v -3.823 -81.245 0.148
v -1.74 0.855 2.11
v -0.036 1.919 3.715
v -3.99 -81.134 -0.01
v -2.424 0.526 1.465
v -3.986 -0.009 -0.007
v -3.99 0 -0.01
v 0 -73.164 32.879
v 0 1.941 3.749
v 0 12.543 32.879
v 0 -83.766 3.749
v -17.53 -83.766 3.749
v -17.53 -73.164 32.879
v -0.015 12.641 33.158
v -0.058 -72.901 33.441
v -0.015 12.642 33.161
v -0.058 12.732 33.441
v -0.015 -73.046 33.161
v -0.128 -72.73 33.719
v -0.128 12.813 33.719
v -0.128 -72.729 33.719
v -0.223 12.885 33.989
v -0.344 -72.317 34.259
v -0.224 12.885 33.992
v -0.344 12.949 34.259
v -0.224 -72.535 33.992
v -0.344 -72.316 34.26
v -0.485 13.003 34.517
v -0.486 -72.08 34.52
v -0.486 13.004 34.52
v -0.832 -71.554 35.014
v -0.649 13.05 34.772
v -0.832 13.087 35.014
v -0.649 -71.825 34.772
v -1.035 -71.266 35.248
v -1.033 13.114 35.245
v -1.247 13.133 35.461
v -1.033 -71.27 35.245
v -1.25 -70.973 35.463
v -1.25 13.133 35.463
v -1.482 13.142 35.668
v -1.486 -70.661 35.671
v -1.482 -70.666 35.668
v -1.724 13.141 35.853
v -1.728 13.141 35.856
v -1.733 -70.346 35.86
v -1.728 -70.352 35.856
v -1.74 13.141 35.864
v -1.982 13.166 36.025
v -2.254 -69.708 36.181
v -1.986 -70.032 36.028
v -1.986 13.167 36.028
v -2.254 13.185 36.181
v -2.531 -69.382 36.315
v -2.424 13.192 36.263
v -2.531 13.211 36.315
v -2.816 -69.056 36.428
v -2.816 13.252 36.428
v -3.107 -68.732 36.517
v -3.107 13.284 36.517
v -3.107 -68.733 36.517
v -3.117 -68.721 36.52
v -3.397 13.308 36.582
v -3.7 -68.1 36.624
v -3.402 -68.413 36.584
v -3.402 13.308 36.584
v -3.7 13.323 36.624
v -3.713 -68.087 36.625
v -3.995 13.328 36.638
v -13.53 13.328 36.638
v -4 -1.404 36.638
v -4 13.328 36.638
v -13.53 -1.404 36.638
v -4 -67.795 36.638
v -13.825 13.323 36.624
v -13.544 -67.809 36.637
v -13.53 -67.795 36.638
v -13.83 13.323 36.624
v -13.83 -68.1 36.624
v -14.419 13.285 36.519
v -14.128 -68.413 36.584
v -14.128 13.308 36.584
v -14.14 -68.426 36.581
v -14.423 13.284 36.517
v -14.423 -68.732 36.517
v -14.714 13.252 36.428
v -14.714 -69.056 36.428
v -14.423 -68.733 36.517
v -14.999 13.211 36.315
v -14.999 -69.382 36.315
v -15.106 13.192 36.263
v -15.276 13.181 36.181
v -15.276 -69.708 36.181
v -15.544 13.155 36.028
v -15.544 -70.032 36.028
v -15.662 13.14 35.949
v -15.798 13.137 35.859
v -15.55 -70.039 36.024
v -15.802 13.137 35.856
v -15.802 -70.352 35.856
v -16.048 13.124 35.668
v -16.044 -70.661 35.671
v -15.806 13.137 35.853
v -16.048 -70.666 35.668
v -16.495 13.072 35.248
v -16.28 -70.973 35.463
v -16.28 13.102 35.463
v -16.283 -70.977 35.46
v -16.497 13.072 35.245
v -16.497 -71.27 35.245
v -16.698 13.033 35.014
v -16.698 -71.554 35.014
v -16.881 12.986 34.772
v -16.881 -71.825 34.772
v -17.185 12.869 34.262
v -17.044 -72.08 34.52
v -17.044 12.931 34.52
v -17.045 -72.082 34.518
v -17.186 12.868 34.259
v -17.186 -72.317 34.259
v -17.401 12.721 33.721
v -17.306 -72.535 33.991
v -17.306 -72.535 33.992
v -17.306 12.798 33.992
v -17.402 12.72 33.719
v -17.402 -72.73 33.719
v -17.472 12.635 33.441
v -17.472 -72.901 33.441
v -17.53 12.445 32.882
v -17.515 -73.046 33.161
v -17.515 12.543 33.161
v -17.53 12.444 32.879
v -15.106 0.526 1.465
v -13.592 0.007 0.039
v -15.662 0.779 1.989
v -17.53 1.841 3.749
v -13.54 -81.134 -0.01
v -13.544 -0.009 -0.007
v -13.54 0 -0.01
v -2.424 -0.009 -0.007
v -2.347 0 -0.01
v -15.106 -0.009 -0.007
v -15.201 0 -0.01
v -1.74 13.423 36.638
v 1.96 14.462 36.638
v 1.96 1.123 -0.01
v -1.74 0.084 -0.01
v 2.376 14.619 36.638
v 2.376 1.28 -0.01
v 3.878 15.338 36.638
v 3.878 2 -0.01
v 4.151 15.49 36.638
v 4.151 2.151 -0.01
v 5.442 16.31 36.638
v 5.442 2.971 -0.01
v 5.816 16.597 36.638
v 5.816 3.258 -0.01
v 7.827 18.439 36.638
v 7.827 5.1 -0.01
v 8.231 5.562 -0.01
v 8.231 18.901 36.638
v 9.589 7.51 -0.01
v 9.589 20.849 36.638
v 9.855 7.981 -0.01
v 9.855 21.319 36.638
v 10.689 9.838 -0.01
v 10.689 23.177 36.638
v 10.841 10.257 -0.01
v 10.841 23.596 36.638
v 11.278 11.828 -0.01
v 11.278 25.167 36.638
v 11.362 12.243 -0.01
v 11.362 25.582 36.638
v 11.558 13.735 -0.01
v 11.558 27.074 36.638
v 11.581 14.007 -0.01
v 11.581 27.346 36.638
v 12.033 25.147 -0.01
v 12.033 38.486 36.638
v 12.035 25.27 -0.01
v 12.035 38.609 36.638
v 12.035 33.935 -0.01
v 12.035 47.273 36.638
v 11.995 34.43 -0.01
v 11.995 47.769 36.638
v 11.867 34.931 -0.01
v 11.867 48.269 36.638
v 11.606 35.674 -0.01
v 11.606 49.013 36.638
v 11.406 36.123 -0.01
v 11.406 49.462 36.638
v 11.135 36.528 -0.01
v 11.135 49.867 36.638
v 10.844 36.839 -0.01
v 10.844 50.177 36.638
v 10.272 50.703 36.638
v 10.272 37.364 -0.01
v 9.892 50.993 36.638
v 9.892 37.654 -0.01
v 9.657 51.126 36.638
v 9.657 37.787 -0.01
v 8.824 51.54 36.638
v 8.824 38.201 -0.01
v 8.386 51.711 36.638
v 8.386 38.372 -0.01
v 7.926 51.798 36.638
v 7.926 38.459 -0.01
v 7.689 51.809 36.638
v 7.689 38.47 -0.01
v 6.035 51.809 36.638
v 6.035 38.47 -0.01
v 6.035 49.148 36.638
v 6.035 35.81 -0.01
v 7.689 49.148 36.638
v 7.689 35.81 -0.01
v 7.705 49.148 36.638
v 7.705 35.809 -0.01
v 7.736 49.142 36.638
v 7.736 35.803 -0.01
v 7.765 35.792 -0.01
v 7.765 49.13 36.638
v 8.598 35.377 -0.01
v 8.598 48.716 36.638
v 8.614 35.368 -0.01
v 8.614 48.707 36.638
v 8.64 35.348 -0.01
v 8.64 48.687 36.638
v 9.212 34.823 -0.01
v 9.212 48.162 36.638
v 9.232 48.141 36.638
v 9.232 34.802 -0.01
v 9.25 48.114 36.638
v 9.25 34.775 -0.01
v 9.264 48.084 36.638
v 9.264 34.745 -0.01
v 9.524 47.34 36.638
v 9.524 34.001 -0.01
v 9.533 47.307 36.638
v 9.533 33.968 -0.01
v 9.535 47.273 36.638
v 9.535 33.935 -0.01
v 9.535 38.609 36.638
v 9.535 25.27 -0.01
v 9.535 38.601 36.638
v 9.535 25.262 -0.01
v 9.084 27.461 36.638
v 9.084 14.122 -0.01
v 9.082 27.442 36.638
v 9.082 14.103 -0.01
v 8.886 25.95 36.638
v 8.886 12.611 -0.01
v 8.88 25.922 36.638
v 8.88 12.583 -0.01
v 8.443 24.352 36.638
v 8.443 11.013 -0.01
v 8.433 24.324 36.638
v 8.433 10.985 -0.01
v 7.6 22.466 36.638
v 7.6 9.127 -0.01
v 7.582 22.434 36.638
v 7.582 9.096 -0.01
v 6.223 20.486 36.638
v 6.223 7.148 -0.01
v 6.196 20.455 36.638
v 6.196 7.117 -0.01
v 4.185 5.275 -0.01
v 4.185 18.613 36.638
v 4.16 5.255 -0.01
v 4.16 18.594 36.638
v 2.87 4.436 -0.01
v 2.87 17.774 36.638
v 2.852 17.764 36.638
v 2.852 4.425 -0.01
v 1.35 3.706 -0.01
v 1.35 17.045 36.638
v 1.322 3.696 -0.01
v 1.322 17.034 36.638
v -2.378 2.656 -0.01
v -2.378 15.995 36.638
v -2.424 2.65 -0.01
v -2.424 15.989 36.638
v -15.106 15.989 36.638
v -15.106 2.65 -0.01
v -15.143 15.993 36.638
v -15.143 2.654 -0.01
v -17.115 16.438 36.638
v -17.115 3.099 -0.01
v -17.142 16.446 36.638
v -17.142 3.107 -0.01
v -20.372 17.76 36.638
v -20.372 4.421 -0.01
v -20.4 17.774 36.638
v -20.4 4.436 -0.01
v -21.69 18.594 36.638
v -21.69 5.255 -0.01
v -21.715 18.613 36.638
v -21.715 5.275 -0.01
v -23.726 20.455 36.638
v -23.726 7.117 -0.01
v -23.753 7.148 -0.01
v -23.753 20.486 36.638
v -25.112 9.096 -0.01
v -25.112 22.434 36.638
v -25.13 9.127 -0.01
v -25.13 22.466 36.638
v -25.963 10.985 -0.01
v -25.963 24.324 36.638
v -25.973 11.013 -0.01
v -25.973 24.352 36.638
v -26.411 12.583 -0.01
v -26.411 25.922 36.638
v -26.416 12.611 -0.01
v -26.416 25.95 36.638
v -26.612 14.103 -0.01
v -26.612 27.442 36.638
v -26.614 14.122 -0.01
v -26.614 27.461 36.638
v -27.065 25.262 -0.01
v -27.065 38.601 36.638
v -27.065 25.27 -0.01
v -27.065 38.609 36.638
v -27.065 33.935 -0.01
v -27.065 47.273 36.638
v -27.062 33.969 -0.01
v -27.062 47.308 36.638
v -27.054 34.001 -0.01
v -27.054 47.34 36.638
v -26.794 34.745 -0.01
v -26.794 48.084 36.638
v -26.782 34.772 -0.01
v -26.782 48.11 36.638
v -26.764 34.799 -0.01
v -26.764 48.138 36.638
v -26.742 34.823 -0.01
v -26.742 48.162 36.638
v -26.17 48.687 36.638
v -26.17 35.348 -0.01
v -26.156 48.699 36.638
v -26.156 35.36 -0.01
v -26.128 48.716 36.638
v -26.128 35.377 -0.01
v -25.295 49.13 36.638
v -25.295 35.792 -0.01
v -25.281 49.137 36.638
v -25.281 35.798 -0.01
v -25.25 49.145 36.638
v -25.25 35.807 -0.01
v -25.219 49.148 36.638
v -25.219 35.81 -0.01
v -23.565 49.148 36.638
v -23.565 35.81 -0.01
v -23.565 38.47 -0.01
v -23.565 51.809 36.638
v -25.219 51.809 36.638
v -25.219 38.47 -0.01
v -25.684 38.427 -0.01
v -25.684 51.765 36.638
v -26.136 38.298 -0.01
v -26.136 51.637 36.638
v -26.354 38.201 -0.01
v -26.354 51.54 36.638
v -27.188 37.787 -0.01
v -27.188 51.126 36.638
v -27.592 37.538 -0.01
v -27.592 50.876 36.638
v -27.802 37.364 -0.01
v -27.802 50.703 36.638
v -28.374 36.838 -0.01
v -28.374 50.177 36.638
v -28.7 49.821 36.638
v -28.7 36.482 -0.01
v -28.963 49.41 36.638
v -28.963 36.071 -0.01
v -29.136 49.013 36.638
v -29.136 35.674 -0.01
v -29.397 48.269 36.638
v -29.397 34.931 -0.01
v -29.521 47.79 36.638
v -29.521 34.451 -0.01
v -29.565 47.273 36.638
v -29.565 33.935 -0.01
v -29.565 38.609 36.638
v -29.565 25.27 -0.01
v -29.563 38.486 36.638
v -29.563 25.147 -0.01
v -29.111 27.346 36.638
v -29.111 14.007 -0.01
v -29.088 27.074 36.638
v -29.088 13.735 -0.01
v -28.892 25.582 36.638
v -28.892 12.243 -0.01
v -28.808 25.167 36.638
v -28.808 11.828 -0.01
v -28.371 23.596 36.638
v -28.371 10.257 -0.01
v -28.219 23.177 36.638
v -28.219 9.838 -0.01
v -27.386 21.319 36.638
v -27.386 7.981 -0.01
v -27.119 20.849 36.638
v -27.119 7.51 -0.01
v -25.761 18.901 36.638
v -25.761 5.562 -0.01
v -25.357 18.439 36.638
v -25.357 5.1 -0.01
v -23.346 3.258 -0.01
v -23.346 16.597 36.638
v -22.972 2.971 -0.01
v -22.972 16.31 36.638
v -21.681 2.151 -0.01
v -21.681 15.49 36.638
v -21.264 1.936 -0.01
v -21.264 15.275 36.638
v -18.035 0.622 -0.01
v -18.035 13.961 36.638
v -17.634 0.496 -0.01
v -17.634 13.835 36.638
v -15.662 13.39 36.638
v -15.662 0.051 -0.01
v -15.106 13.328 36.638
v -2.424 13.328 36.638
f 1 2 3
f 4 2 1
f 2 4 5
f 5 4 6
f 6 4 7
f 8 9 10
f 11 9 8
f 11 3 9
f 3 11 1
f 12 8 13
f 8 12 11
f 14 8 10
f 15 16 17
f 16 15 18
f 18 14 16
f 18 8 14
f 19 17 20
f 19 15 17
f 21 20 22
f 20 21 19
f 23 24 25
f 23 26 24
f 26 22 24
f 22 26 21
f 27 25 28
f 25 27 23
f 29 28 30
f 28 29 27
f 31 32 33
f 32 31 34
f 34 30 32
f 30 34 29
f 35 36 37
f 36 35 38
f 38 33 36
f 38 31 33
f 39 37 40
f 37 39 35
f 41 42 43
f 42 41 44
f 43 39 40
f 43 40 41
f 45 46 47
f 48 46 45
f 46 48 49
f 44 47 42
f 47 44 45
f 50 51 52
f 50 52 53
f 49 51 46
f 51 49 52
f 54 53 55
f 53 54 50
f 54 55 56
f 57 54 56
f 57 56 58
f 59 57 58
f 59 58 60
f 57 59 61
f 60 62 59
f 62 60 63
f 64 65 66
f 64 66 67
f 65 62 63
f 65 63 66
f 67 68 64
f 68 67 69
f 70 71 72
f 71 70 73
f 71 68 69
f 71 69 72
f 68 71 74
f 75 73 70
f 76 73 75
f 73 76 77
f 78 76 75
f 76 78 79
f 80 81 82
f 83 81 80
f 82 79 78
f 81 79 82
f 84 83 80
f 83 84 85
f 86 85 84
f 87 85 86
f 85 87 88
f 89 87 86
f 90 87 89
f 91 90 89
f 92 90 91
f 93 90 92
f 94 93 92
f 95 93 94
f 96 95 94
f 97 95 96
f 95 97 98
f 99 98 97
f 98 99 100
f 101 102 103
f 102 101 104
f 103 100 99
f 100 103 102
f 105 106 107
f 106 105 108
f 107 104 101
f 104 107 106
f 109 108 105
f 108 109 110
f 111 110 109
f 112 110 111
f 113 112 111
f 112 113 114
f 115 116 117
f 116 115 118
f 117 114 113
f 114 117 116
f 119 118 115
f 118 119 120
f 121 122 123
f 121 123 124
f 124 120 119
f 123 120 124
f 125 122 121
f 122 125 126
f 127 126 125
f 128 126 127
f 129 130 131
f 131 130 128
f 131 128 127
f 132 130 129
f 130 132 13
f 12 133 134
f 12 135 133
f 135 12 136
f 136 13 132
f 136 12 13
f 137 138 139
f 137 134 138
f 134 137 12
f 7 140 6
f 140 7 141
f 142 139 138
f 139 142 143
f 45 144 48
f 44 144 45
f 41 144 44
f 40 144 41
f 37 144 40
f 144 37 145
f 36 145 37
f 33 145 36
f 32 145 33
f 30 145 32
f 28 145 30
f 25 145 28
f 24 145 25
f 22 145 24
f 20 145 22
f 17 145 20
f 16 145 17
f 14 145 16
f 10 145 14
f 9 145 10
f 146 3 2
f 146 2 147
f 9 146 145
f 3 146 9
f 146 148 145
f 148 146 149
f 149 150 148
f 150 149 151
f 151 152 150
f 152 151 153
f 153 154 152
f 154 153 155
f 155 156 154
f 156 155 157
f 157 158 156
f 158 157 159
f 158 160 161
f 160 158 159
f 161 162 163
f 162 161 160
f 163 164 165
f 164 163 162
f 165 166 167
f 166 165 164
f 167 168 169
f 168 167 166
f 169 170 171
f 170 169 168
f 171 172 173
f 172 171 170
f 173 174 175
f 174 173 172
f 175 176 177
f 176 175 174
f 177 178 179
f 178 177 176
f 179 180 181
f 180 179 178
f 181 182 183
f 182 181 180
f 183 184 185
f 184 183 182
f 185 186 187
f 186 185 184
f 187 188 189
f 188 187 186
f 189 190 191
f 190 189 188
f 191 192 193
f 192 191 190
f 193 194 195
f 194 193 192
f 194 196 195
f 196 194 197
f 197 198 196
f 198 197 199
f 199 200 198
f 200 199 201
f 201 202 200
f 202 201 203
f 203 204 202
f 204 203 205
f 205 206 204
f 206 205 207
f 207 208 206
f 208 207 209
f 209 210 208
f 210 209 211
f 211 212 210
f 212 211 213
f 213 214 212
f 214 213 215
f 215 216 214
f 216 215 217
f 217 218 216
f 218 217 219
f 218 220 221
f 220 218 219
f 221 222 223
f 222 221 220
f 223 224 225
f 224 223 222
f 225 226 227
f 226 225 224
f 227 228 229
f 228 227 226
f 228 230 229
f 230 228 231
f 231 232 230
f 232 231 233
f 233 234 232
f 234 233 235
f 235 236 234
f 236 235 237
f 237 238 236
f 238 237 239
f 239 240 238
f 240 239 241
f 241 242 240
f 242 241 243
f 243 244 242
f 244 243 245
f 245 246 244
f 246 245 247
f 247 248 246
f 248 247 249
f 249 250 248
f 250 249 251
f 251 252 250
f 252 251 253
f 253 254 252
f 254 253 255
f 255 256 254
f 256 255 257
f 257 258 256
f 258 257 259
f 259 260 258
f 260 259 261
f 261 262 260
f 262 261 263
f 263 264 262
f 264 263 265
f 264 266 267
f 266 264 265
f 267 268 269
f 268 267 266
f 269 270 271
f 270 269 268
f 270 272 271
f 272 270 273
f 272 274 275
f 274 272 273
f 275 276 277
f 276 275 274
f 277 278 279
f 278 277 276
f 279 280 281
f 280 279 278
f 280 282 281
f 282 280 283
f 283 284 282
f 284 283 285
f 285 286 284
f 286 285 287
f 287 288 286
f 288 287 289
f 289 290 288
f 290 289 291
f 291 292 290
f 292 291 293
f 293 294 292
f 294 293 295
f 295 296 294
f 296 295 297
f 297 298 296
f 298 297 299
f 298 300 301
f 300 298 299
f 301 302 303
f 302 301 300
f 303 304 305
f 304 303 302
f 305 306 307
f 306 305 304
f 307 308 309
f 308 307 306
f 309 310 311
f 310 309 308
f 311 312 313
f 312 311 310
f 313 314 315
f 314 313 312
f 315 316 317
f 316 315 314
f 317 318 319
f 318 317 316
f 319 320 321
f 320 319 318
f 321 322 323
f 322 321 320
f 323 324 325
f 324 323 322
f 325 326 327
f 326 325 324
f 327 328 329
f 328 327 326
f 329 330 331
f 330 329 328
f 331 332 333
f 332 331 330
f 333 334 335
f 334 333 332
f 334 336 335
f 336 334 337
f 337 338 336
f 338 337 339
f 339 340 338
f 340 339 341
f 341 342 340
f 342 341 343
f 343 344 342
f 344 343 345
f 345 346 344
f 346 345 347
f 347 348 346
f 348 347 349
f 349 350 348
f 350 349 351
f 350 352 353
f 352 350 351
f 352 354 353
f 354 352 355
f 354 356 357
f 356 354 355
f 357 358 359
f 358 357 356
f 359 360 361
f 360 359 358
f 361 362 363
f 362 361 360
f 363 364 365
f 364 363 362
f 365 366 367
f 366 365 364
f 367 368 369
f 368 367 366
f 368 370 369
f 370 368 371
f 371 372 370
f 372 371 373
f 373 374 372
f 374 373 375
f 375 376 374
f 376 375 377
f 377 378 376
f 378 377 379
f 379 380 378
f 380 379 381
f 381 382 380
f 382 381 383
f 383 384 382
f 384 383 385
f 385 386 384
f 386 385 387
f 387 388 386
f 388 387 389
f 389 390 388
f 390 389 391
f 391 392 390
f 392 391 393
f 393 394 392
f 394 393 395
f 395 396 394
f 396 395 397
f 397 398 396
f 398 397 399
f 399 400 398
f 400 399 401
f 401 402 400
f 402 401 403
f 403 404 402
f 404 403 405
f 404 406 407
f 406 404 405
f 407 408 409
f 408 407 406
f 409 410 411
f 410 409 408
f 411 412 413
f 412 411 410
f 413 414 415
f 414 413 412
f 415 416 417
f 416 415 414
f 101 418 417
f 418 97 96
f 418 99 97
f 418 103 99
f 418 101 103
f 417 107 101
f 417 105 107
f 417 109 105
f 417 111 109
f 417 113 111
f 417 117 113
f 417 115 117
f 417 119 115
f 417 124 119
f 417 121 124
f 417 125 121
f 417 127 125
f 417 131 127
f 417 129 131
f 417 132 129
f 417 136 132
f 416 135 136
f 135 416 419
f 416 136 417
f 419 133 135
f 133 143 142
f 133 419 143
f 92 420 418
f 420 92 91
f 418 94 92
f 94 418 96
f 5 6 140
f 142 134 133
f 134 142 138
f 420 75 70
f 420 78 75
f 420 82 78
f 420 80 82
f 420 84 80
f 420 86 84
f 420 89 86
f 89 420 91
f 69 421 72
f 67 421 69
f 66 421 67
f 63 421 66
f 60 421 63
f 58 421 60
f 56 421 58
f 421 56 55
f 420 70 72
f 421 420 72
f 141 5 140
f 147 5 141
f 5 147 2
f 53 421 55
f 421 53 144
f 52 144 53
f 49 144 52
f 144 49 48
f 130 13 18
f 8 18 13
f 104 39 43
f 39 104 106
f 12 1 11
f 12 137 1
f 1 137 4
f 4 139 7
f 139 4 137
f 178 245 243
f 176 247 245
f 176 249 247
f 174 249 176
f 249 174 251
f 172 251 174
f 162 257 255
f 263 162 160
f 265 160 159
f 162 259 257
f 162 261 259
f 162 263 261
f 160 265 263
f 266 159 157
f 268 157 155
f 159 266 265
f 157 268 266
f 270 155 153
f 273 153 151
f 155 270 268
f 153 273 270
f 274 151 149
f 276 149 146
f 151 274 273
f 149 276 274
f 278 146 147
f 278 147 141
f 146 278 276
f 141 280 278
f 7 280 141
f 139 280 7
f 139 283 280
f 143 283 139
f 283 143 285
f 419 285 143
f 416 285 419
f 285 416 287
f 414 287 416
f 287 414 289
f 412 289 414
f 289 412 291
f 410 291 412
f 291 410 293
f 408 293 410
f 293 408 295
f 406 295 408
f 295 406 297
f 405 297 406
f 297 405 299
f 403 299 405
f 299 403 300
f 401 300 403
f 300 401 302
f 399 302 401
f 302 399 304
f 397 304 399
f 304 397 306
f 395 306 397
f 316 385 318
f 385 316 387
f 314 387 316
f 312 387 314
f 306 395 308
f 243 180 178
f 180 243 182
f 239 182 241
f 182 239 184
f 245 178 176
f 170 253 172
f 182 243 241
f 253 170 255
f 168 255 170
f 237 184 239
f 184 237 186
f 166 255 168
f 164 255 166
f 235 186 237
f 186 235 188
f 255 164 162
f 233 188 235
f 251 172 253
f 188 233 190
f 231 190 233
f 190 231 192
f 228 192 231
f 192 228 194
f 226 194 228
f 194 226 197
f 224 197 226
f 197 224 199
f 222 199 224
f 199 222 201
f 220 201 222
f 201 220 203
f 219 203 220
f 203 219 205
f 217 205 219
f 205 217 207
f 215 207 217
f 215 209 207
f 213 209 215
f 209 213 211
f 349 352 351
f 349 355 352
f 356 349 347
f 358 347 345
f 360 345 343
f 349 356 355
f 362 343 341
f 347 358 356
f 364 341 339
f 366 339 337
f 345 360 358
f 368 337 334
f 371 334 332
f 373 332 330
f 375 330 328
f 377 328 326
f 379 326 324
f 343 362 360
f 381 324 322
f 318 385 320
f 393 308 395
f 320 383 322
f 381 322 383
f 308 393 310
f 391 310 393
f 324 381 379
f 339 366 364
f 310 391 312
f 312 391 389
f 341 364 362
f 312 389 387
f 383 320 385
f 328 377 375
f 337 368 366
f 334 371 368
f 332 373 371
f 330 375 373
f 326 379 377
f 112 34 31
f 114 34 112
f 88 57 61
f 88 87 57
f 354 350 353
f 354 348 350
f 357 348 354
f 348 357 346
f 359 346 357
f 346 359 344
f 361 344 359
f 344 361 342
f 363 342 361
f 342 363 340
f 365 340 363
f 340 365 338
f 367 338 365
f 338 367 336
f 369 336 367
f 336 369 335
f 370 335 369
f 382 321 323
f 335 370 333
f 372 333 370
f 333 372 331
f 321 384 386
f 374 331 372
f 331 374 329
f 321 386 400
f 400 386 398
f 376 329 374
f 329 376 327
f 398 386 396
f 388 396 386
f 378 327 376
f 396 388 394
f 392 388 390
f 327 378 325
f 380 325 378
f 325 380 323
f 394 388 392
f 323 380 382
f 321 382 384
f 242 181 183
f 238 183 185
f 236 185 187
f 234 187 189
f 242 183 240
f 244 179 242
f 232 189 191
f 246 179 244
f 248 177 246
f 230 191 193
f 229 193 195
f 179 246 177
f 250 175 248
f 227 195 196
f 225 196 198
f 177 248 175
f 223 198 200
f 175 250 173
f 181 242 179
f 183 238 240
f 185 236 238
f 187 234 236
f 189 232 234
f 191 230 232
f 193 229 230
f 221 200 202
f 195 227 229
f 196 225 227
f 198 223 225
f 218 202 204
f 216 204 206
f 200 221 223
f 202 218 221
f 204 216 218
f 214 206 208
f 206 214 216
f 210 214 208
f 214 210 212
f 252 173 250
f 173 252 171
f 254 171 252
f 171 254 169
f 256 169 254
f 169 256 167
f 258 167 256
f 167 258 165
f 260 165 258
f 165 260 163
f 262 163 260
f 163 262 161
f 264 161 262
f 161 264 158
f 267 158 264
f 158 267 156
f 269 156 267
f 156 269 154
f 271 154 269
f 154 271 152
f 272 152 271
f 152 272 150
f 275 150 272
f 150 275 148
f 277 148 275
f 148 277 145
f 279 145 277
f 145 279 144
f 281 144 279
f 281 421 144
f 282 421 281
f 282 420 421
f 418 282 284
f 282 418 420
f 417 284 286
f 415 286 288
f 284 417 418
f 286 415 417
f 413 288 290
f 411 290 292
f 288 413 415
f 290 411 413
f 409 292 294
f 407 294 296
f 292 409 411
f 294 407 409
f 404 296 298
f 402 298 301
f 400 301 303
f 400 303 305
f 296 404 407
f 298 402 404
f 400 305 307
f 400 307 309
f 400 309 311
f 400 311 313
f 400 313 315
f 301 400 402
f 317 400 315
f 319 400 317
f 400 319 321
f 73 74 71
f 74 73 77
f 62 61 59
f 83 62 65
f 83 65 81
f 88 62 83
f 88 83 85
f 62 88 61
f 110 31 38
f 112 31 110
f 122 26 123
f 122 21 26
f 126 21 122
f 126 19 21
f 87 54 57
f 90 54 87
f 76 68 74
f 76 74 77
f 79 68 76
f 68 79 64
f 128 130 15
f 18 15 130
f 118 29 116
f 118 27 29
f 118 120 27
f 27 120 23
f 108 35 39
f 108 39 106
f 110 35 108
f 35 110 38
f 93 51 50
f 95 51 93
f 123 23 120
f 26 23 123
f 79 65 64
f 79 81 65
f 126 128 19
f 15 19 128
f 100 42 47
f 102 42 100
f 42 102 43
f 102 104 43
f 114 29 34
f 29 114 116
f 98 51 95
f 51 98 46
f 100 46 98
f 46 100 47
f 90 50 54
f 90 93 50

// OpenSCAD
// This file was processed by resolve-include.py [https://github.com/arpruss/miscellaneous-scad/blob/master/scripts/resolve-include.py] 
// to include  all the dependencies inside one file.

includeGrip = true;
tolerance = 0.18;
wallThicknesss = 2.5;
tabSize = 3.5;
gripLength = 39;
gripWidth = 17.53;
lip = 3;
// the following only apply if you do include the grip
gripHeight = 80;
gripAngle = 20;
gripBevel = 4;

// the following only apply if you don't include the grip
extrawallThicknesss = 3;
screwHoleDiameter = 4;
screwHoleInsetDepth = 3;
screwHoleInsetDiameter = 9;

module end_of_parameters_dummy() {}


//BEGIN DEPENDENCY: use <Bezier.scad>;
/*
Copyright (c) 2017 Alexander R. Pruss.

Licensed under any Creative Commons Attribution license you like or under the
following MIT License.

Permission is hereby granted, free of charge, to any person obtaining a copy
of this software and associated documentation files (the "Software"), to deal
in the Software without restriction, including without limitation the rights
to use, copy, modify, merge, publish, distribute, sublicense, and/or sell
copies of the Software, and to permit persons to whom the Software is
furnished to do so, subject to the following conditions:

The above copyright notice and this permission notice shall be included in all
copies or substantial portions of the Software.

THE SOFTWARE IS PROVIDED "AS IS", WITHOUT WARRANTY OF ANY KIND, EXPRESS OR
IMPLIED, INCLUDING BUT NOT LIMITED TO THE WARRANTIES OF MERCHANTABILITY,
FITNESS FOR A PARTICULAR PURPOSE AND NONINFRINGEMENT. IN NO EVENT SHALL THE
AUTHORS OR COPYRIGHT HOLDERS BE LIABLE FOR ANY CLAIM, DAMAGES OR OTHER
LIABILITY, WHETHER IN AN ACTION OF CONTRACT, TORT OR OTHERWISE, ARISING FROM,
OUT OF OR IN CONNECTION WITH THE SOFTWARE OR THE USE OR OTHER DEALINGS IN THE
SOFTWARE.

*/


// Public domain Bezier stuff from www.thingiverse.com/thing:8443
function BEZ03(u) = pow(1-u, 3);
function BEZ13(u) = 3*u*pow(1-u,2);
function BEZ23(u) = 3*pow(u,2)*(1-u);
function BEZ33(u) = pow(u,3);
function PointAlongBez4(p0, p1, p2, p3, u) =
	BEZ03(u)*p0+BEZ13(u)*p1+BEZ23(u)*p2+BEZ33(u)*p3;
// End public domain Bezier stuff
function d2BEZ03(u) = 6*(1-u);
function d2BEZ13(u) = 18*u-12;
function d2BEZ23(u) = -18*u+6;
function d2BEZ33(u) = 6*u;

function worstCase2ndDerivative(p0, p1, p2, p3, u1, u2)
    = norm([
        for(i=[0:len(p0)-1])
            max([for(u=[u1,u2])
                d2BEZ03(u)*p0[i]+d2BEZ13(u)*p1[i]+
                d2BEZ23(u)*p2[i]+d2BEZ33(u)*p3[i]]) ]);

function neededIntervalLength(p0,p1,p2,p3,u1,u2,tolerance)
    = let(d2=worstCase2ndDerivative(p0,p1,p2,p3,u1,u2))
        d2==0 ? u2-u1+1 : sqrt(2*tolerance/d2);

function REPEAT_MIRRORED(v,angleStart=0,angleEnd=360) = ["m",v,angleStart,angleEnd];
function SMOOTH_REL(x) = ["r",x];
function SMOOTH_ABS(x) = ["a",x];
function SYMMETRIC() = ["r",1];
function OFFSET(v) = ["o",v];
function SHARP() = OFFSET([0,0,0]);
function LINE() = ["l",0];
function POLAR(r,angle) = OFFSET(r*[cos(angle),sin(angle)]);
//function POINT_IS_SPECIAL(v) = (v[0]=="r" || v[0]=="a" || v[0]=="o" || v[0]=="l");

// this does NOT handle offset type points; to handle those, use DecodeBezierOffsets()
function getControlPoint(cp,node,otherCP,otherNode,nextNode) =
    let(v=node-otherCP) (
    cp[0]=="r" ? node+cp[1]*v:
    cp[0]=="a" ? (
        norm(v)<1e-9 ? node+cp[1]*(node-otherNode)/norm(node-otherNode) : node+cp[1]*v/norm(v) ) :
        cp );

function onLine2(a,b,c,eps=1e-4) =
    norm(c-a) <= eps ? true
        : norm(b-a) <= eps ? false /* to be safe */
            : abs((c[1]-a[1])*(b[0]-a[0]) - (b[1]-a[1])*(c[0]-a[0])) <= eps * eps && norm(c-a) <= eps + norm(b-a);

function isStraight2(p1,c1,c2,p2,eps=1e-4) =
    len(p1) == 2 &&
    onLine2(p1,p2,c1,eps=eps) && onLine2(p2,p1,c2,eps=eps);

function Bezier2(p,index=0,precision=0.05,rightEndPoint=true,optimize=true) = let(nPoints=
        max(1, precision < 0 ?
                    ceil(1/
                        neededIntervalLength(p[index],p[index+1],p[index+2],p[index+3],0,1,-precision))
                    : ceil(1/precision)) )
    optimize && isStraight2(p[index],p[index+1],p[index+2],p[index+3]) ? (rightEndPoint?[p[index+0],p[index+3]]:[p[index+0]] ) :
    [for (i=[0:nPoints-(rightEndPoint?0:1)]) PointAlongBez4(p[index+0],p[index+1],p[index+2],p[index+3],i/nPoints)];

function flatten(listOfLists) = [ for(list = listOfLists) for(item = list) item ];


// p is a list of points, in the format:
// [node1,control1,control2,node2,control3, control4,node3, ...]
// You can replace inner control points with:
//   SYMMETRIC: uses a reflection of the control point on the other side of the node
//   SMOOTH_REL(x): like SYMMETRIC, but the distance of the control point to the node is x times the distance of the other control point to the node
//   SMOOTH_ABS(x): like SYMMETRIC, but the distance of the control point to the node is exactly x
// You can also replace any control point with:
//   OFFSET(v): puts the control point at the corresponding node plus the vector v
//   SHARP(): equivalent to OFFSET([0,0])
//   LINE(): when used for both control points between two nodes, generates a straight line
//   POLAR(r,angle): like OFFSET, except the offset is specified in polar coordinates

function DecodeBezierOffset(control,node) = control[0] == "o" ? node+control[1] : control;

function _mirrorMatrix(normalVector) = let(v = normalVector/norm(normalVector)) len(v)<3 ? [[1-2*v[0]*v[0],-2*v[0]*v[1]],[-2*v[0]*v[1],1-2*v[1]*v[1]]] : [[1-2*v[0]*v[0],-2*v[0]*v[1],-2*v[0]*v[2]],[-2*v[0]*v[1],1-2*v[1]*v[1],-2*v[1]*v[2]],[-2*v[0]*v[2],-2*v[1]*v[2],1-2*v[2]*v[2]]];

function _correctLength(p,start=0) =
    start >= len(p) || p[start][0] == "m" ? 3*floor(start/3)+1 : _correctLength(p,start=start+1);

function _trimArray(a, n) = [for (i=[0:n-1]) a[i]];

function _transformPoint(matrix,a) =
    let(n=len(a))
        len(matrix[0])==n+1 ?
            _trimArray(matrix * concat(a,[1]), n)
            : matrix * a;

function _transformPath(matrix,path) =
    [for (a=path) _transformPoint(matrix,a)];

function _reverseArray(array) = let(n=len(array)) [for (i=[0:n-1]) array[n-1-i]];

function _stitchPaths(a,b) = let(na=len(a)) [for (i=[0:na+len(b)-2]) i<na? a[i] : b[i-na+1]-b[0]+a[na-1]];

// replace all OFFSET/SHARP/POLAR points with coordinates
function DecodeBezierOffsets(p) = [for (i=[0:_correctLength(p)-1]) i%3==0?p[i]:(i%3==1?DecodeBezierOffset(p[i],p[i-1]):DecodeBezierOffset(p[i],p[i+1]))];

function _mirrorPaths(basePath, control, start) =
    control[start][0] == "m" ? _mirrorPaths(_stitchPaths(basePath,_reverseArray(_transformPath(_mirrorMatrix( control[start][1] ),basePath))), control, start+1) : basePath;

function DecodeMirrored(path,start=0) =
    start >= len(path) ? path :
    path[start][0] == "m" ? _mirrorPaths([for(i=[0:1:start-1]) path[i]], path, start) :
        DecodeMirrored(path,start=start+1);

function DecodeLines(p) = [for (i=[0:len(p)-1])
    i%3==0 || p[i][0] != "l" ? p[i] :
    i%3 == 1 ? (p[i-1]*2+p[i+2])/3 :
    (p[i-2]+p[i+1]*2)/3 ];

function DecodeSpecialBezierPoints(p0) =
    let(
        l = _correctLength(p0),
        doMirror = len(p0)>l && p0[l][0] == "m",
        p1=DecodeLines(p0),
        p=DecodeBezierOffsets(p1),
        basePath = [for (i=[0:l-1]) i%3==0?p[i]:(i%3==1?getControlPoint(p[i],p[i-1],p[i-2],p[i-4],p[i+2]):getControlPoint(p[i],p[i+1],p[i+2],p[i+4],p[i-2]))])
        doMirror ? _mirrorPaths(basePath, p0, l) : basePath;

function Distance2D(a,b) = sqrt((a[0]-b[0])*(a[0]-b[0])+(a[1]-b[1])*(a[1]-b[1]));

function RemoveDuplicates(p,eps=0.00001) = let(safeEps = eps/len(p)) [for (i=[0:len(p)-1]) if(i==0 || i==len(p)-1 || Distance2D(p[i-1],p[i]) >= safeEps) p[i]];

function Bezier(p,precision=0.05,eps=0.00001,optimize=true) = let(q=DecodeSpecialBezierPoints(p), nodes=(len(q)-1)/3) RemoveDuplicates(flatten([for (i=[0:nodes-1]) Bezier2(q,optimize=optimize,index=i*3,precision=precision,rightEndPoint=(i==nodes-1))]),eps=eps);

function GetSplineAngle(a,b,c) =
    a==c && b==a ? 0 :
    a==c ? let(ba=b-a) atan2(ba[1],ba[0]) :
    let(ca=c-a) atan2(ca[1],ca[0]);

/*    let(ba=norm(b-a),cb=norm(c-b))
        ba == 0 && cb == 0 ? 0 :
    let(v = ba == 0 ? c-b :
            cb == 0 ? b-a :
            (c-b)*norm(b-a)/norm(c-b)+(b-a))
    atan2(v[1],v[0]); */

// do a spline around b
function SplineAroundPoint(a,b,c,tension=0.5,includeLeftCP=true,includeRightCP=true) =
    includeLeftCP && includeRightCP ?
        [POLAR(tension*norm(a-b),GetSplineAngle(c,b,a)),b,POLAR(tension*norm(c-b),GetSplineAngle(a,b,c))] :
    includeLeftCP ?
        [POLAR(tension*norm(a-b),GetSplineAngle(c,b,a)),b] :
    includeRightCP ?
        [b,POLAR(tension*norm(c-b),GetSplineAngle(a,b,c))] :
        [b];

function mod(n,m) = let(q=n%m) q>=0 ? q : m+q;

function _unit(v) = norm(v)==0 ? [for(x=v) 0] : v/norm(v);

function _corner(p0,p1,p2,offset=2,tension=0.448084975506) =
    [p1-_unit(p1-p0)*offset,
    p1-_unit(p1-p0)*offset*(1-tension),
    p1-_unit(p1-p2)*offset*(1-tension),
    p1-_unit(p1-p2)*offset,
    LINE(),LINE()];

function _roundPathRaw(path,start,end,offset=2,tension=0.551915024494) =
    let(n=len(path),
        p2=_mirrorPaths(path))
        [for(p=[for(i=[start:1:end-1]) _corner(p2[mod(i-1,n)],p2[i],path[mod(i+1,n)],offset=offset,tension=tension)]) for(q=p) q];

function PathToBezier(path,offset=2,tension=0.551915024494,closed=false) =
    let(p1=DecodeMirrored(path),
        n=len(p1))
        offset==0 && tension==0 ?
        p1 :
        !closed ? concat([p1[0],LINE(),LINE()], _roundPathRaw(p1,1,n-1,offset=offset,tension=tension), [p1[n-1]]) :
        let(p2 = _roundPathRaw(p1,0,n,offset=offset,tension=tension),
            n2 = len(p2))
        [for(i=[0:1:n2-3]) p2[mod(i,n2)]];
function BezierSmoothPoints(points,tension=0.5,closed=false)
    = let (n=len(points))
        flatten(
        closed ? [ for (i=[0:n]) SplineAroundPoint(points[(n+i-1)%n],points[i%n],points[(i+1)%n],tension=tension,includeLeftCP=i>0,includeRightCP=i<n) ] :
        [ for (i=[0:n-1])
            SplineAroundPoint(
            i==0 ? 2*points[0]-points[1] : points[(n+i-1)%n],
            points[i],
            i==n-1 ? 2*points[n-1]-points[n-2] : points[(i+1)%n],tension=tension,includeLeftCP=i>0,includeRightCP=i<n-1  ) ]);

module BezierVisualize(p,precision=0.05,eps=0.00001,lineThickness=0.25,controlLineThickness=0.125,nodeSize=1) {
    $fn = 16;
    dim = len(p[0]);
    module point(size) {
        if (dim==2)
            circle(d=size);
        else
            sphere(d=size);
    }
    p1 = DecodeSpecialBezierPoints(p);
    l = Bezier(p1,precision=precision,eps=eps);
    for (i=[0:len(l)-2]) {
        hull() {
            translate(l[i]) point(lineThickness);
            translate(l[i+1]) point(lineThickness);
        }
    }
    for (i=[0:len(p1)-1]) {
        if (i%3 == 0) {
            color("black") translate(p1[i]) point(nodeSize);
        }
        else {
            node = i%3 == 1 ? i-1 : i+1;
            color("red") translate(p1[i]) point(nodeSize);
            color("red") hull() {
                translate(p1[node]) point(controlLineThickness);
                translate(p1[i]) point(controlLineThickness);
            }
        }
    }
}


//END DEPENDENCY: use <Bezier.scad>;


//BEGIN DEPENDENCY: use <pointhull.scad>;
function _slice(list,start,end=undef) =
    let(end = end==undef?len(list):end)
    [for(i=[start:1:end-1]) list[i]];

function _delete(list,pos) =
    let(l=len(list))
    pos == 0 ? [for(i=[1:1:l-1]) list[i]] :
    pos >= l-1 ? [for(i=[0:1:pos-1]) list[i]] :
    concat([for(i=[0:1:pos-1]) list[i]],
        [for(i=[pos+1:1:l-1]) list[i]]);

function _areCollinear(a,b,c) = cross(b-a,c-a) == [0,0,0];

function _areCoplanar(a,b,c,d) = (d-a)*cross(b-a,c-a) == 0;

function _findNoncollinear(list,point1,point2,pos=0) =
    pos >= len(list) ? undef :
    ! _areCollinear(point1,point2,list[pos]) ? pos :
    _findNoncollinear(list,point1,point2,pos=pos+1);

function _findNoncoplanar(list,point1,point2,point3,pos=0) =
   pos >= len(list) ? undef :
   ! _areCoplanar(point1,point2,point3,list[pos]) ? pos :
        _findNoncoplanar(list,point1,point2,point3,pos=pos+1);

function _isBoundedBy(a,face,strict=false) =
    cross(face[1]-face[0],face[2]-face[0])*(a-face[0]);

function _makeTet(a,b,c,d) =
    _isBoundedBy(d,[a,b,c]) >= 0 ?
        [[a,b,c],[b,a,d],[c,b,d],[a,c,d]] :
        [[c,b,a],[d,a,b],[d,b,c],[d,c,a]];

function _findTri(list) =
    let(l2=_unique(list))
    assert(len(l2)>=3)
    let(a=l2[0],
        b=l2[1],
        l3=_slice(l2,2),
        ci=_findNoncollinear(l3,a,b),
        c=assert(ci != undef) l3[ci],
        l4=_delete(l3,ci))
        [[a,b,c],l4];

function _findTet(list) =
    let(ft=_findTri(list),
        tri=ft[0],
        l4=ft[1],
        di=assert(len(l4)>0) _findNoncoplanar(l4,tri[0],tri[1],tri[2]),
        d=assert(di != undef) l4[di],
        l5=_delete(l4,di))
        [_makeTet(tri[0],tri[1],tri[2],d),l5];

function _find(list,value) =
    let(m=search([value],list,1)[0])
    m==[] ? undef : m;

function _unique(list,soFar=[],pos=0) =
    pos >= len(list) ? soFar :
    _find(soFar,list[pos]) == undef ? _unique(list,soFar=concat(soFar,[list[pos]]),pos=pos+1) :
    _unique(list,soFar=soFar,pos=pos+1);

function _makePointsAndFaces(triangles) =
    let(points=_unique([for(t=triangles) for(v=t) v]))
        [points, [for(t=triangles) [for(v=t) _find(points,v)]]];

function _sameSide(p1,p2, a,b) =
    let(cp1 = cross(b-a, p1-a),
        cp2 = cross(b-a, p2-a))
        cp1*cp2 >= 0;

function _insideTriangle(p, t) =
    _sameSide(p,t[0],t[1],t[2]) &&
    _sameSide(p,t[1],t[0],t[2]) &&
    _sameSide(p,t[2],t[0],t[1]);


function _satisfiesConstraint(p, triangle) =
    let(c=_isBoundedBy(p, triangle))
    c > 0 || (c == 0 && _insideTriangle(p, triangle));


function _insidePoly(p, triangles, pos=0) =
    pos >= len(triangles) ? true :
    !_satisfiesConstraint(p, triangles[pos]) ? false :
    _insidePoly(p, triangles, pos=pos+1);

function _outerEdges(triangles) =
        let(edges=[for(t=triangles) for(e=[[t[0],t[1]],
                [t[1],t[2]],
                [t[2],t[0]]]) e])
        [for(e=edges) if(undef == _find(edges,[e[1],e[0]])) e];

function _unlit(triangles, p) = [for(t=triangles) if(_isBoundedBy(p, t) >= 0) t];

function _addToHull(h, p) =
    let(unlit = _unlit(h,p),
        edges = _outerEdges(unlit))
        concat(unlit, [for(e=edges) [e[1],e[0],p]]);

function _expandHull(h, points, pos=0) =
    pos >= len(points) ? h :
    !_insidePoly(points[pos],h) ?  _expandHull(_addToHull(h,points[pos]),points,pos=pos+1) :
    _expandHull(h, points, pos=pos+1);

function pointHull3D(points) =
    let(ft=_findTet(points))
        _expandHull(ft[0], ft[1]);

function _traceEdges(edgeStarts,edgeEnds,soFar=undef) =
    soFar==undef ? _traceEdges(edgeStarts,edgeEnds,[edgeStarts[0]]) :
    assert(soFar[len(soFar)-1] != undef)
    len(soFar)>1 && soFar[len(soFar)-1] == soFar[0] ? _slice(soFar,1) :
    _traceEdges(edgeStarts,edgeEnds,soFar=concat(soFar,[edgeEnds[_find(edgeStarts,soFar[len(soFar)-1])]]));

function _project(v) = [v[0],v[1]];

function pointHull2D(points) =
    let(
        p3d = concat([[0,0,1]],
            [for(p=points) [p[0],p[1],0]]),
        h = pointHull3D(p3d),
        edgeStarts = [for(t=h) if(t[0][2]==1 || t[1][2]==1 || t[2][2]==1)
                t[0][2]==1 ? _project(t[1]) :
                t[1][2]==1 ? _project(t[2]) :
                _project(t[0]) ],
        edgeEnds = [for(t=h) if(t[0][2]==1 || t[1][2]==1 || t[2][2]==1)
                t[0][2]==1 ? _project(t[2]) :
                t[1][2]==1 ? _project(t[0]) :
                _project(t[1]) ])
        _traceEdges(edgeStarts,edgeEnds,soFar=[edgeStarts[0]]);

function pointHull(points) =
    len(points[0]) == 2 ? pointHull2D(points) :
        pointHull3D(points);

module pointHull(points) {
    if (len(points[0])==2) {
        polygon(pointHull2D(points));
    }
    else {
        paf = _makePointsAndFaces(pointHull3D(points));
        polyhedron(points=paf[0],faces=paf[1]);
    }
}

function extractPointsFromHull(h) =
    _unique(
        is_num(h[0][0]) ? h : [for(t=h) for(v=t) v] );

function _d22(a00,a01,a10,a11) = a00*a11-a01*a10;

function _determinant3x3(m) = m[0][0]*_d22(m[1][1],m[1][2],m[2][1],m[2][2])
    -m[0][1]*_d22(m[1][0],m[1][2],m[2][0],m[2][2])
    +m[0][2]*_d22(m[1][0],m[1][1],m[2][0],m[2][1]);

function _determinant2x2(m) = _d22(m[0][0],m[0][1],m[1][0],m[1][1]);

// Cramer's rule
// n.b. Determinant of matrix is the same as of its transpose
function _solve3(a,b,c) =
    let(det=_determinant3x3([a[0],b[0],c[0]]))
    det == 0 ? undef :
    let(rhs=[a[1],b[1],c[1]],
        col0=[a[0][0],b[0][0],c[0][0]],
        col1=[a[0][1],b[0][1],c[0][1]],
        col2=[a[0][2],b[0][2],c[0][2]])
    [_determinant3x3([rhs,col1,col2]),
    _determinant3x3([col0,rhs,col2]),
    _determinant3x3([col0,col1,rhs])]/det;

function _solve2(a,b) =
    let(det=_determinant2x2([a[0],b[0]]))
    det == 0 ? undef :
    let(rhs=[a[1],b[1]],
        col0=[a[0][0],b[0][0]],
        col1=[a[0][1],b[0][1]])
    [_determinant2x2([rhs,col1]),
    _determinant2x2([col0,rhs])]/det;

function _satisfies(p,constraint) =
    p*constraint[0] <= constraint[1];

function _linearConstraintExtrema(constraints,constraintsMarked=false) =
        let(c=_unique(constraints),
            n=len(c))
        len(c[0][0]) == 3 ?
        [
        for(i=[0:1:n-1]) for(j=[i+1:1:n-1]) for(k=[j+1:1:n-1]) let(p=_solve3(c[i],c[j],c[k])) if(p!=undef && _satisfiesAll(p,c,except1=i,except2=j,except3=k)) constraintsMarked?[p,[i,j,k]]:p
        ] :
        [
        for(i=[0:1:n-1]) for(j=[i+1:1:n-1]) let(p=_solve2(c[i],c[j])) if(p!=undef && _satisfiesAll(p,c,except1=i,except2=j)) constraintsMarked?[p,[i,j,-1]]:p
        ];

function _satisfiesAll(p,c,except1=undef,except2=undef,except3=undef,pos=0) =
        pos >= len(c) ? true :
        except1 == pos || except2 == pos || except3 == pos || _satisfies(p,c[pos]) ? _satisfiesAll(p,c,except1,except2,except3,pos=pos+1) :
        false;


module linearConstraintShape(constraints) {
    pointHull(_linearConstraintExtrema(constraints));
}

// 3D inly
function _onPlane(v,planeIndex,data,pos=0) =
    pos >= len(data) ? false :
    data[pos][0] == v && (data[pos][1][0] == planeIndex || data[pos][1][1] == planeIndex || data[pos][1][2] == planeIndex) ? true :
    _onPlane(v,planeIndex,data,pos=pos+1);

// 3D only
function _getFaceOnPlane(planeIndex,triangles,data) =
    let(trianglesOnPlane = [for(t=triangles) if (_onPlane(t[0],planeIndex,data) &&
        _onPlane(t[1],planeIndex,data) &&
        _onPlane(t[2],planeIndex,data)) t],
        outer = _outerEdges(trianglesOnPlane),
        edgeStarts = [for(e=outer) e[0]],
        edgeEnds = [for(e=outer) e[1]]
    ) len(outer) == 0 ? undef : echo("se",edgeStarts,edgeEnds) _traceEdges(edgeStarts,edgeEnds);

// 3D only, does not work if there are multiple planes defined by the same constraint
function linearConstraintPointsAndFaces(constraints) =
    let(data=_linearConstraintExtrema(constraints,constraintsMarked=true),
    extremePoints=[for(d=data) d[0]],

    triangles=pointHull(extremePoints),
    hullPoints=extractPointsFromHull(triangles),
    faces=[for (i=[0:len(constraints)-1]) [for(v=_getFaceOnPlane(i,triangles,data)) if(v != undef) _find(hullPoints,v)]]
    )
    [hullPoints,faces];

function hullPoints(points) =
    extractPointsFromHull(pointHull(points));

module dualHull(points) {
    p = hullPoints(points);
    constraints = [for(v=p) [v,v*v]];
    linearConstraintShape(constraints);
}


//END DEPENDENCY: use <pointhull.scad>;



module dummy() {}

$fn = 36;

nudge = 0.01;

wiiY = 30.8;
size_xsect_0 = [36.240508333,29.876988125];
size_xsect_1 = [size_xsect_0[0],wiiY];
// paths for xsect_1

points_xsect_1_1 = [ [-6.340977708,14.938494063],[-10.041222909,13.991003059],[-11.542611892,13.335288548],[-12.832843571,12.588143262],[-14.843830332,10.909206052],[-16.202173828,9.133482813],[-17.035864698,7.440264924],[-17.472893577,6.008843770],[-17.668927917,4.648557188],[-18.120254167,-5.506045312],[-18.120254167,-13.404016562],[-17.859895898,-14.081701709],[-17.287107708,-14.560520234],[-16.453961250,-14.938494063],[-0.157929792,-14.938494063],[16.454040625,-14.938494063],[17.287147396,-14.560520234],[17.859908301,-14.081701709],[18.120254167,-13.404016562],[18.120254167,-5.506045312],[17.668954375,4.648557188],[17.472919622,6.008843770],[17.035889761,7.440264924],[16.202196979,9.133482813],[14.843850330,10.909206052],[12.832858867,12.588143262],[11.542624159,13.335288548],[8.312682448,14.532875371],[6.340977708,14.938494063],[-6.340977708,14.938494063] ];

module xsect(delta=0) {
 render(convexity=4) {
    rotate(180)
    offset(r=delta)
    scale([1,wiiY/size_xsect_0[1]])
    polygon(points=points_xsect_1_1);
 }
}

module outline() {
    w  = size_xsect_1[0]+2*tolerance-2*tabSize;
    difference() {
        union() {
            xsect(delta=tolerance+wallThicknesss);
            w1 = gripWidth;
            if (!includeGrip) translate([-w1/2,-size_xsect_1[1]/2-extrawallThicknesss-tolerance-wallThicknesss]) square([w1,extrawallThicknesss+wallThicknesss+nudge]);
        }
        xsect(delta=tolerance);
        translate([-w/2,0]) square([w,size_xsect_1[1]+tolerance+wallThicknesss]);
    }
}

module screwHoles() {
    for (i=[0.25,0.75])
    translate([0,-size_xsect_1[1]/2-tolerance,i*gripLength])
    rotate([-90,0,0]) {
        translate([0,0,-100+nudge]) cylinder(d=screwHoleDiameter,h=100);
        translate([0,0,-screwHoleInsetDepth+2*nudge]) cylinder(d1=screwHoleDiameter,d2=screwHoleInsetDiameter,h=screwHoleInsetDepth);
    }
}

module gripless() {
    difference() {
        linear_extrude(height=gripLength)
        outline();
        screwHoles();
    }
}

gripOffset = gripHeight*tan(gripAngle);

gripOutlineSideView = let(dx = sin(gripAngle) * gripBevel,
    dy = cos(gripAngle) * gripBevel, h = size_xsect_1[1]+2*wallThicknesss+2*tolerance) Bezier(
    [[h*tan(gripAngle),h],LINE(),LINE(),[h*tan(gripAngle)+gripLength,h],LINE(),LINE(),[gripLength-gripOffset+dx,-gripHeight+dy],OFFSET([-dx,-dy]*0.5),OFFSET([gripBevel*0.5,0]),[gripLength-gripOffset-gripBevel,-gripHeight],LINE(),LINE(),[-gripOffset+gripBevel,-gripHeight],LINE(),LINE(),[-gripOffset+dx,-gripHeight+dy]]);

gripOutlineBottomView = Bezier([[-nudge,gripWidth/2],LINE(),LINE(),[-nudge,gripBevel],LINE(),LINE(),[gripBevel,0],LINE(),LINE(),[gripLength-gripBevel,0],SMOOTH_ABS(gripBevel*0.5),SMOOTH_ABS(gripBevel*0.5),[gripLength,gripBevel],LINE(),LINE(),[gripLength,gripWidth/2],REPEAT_MIRRORED([0,1])]);

function atXY(points2D,x,y) = [for (p=points2D) [p[0]+x,y,p[1]]];

module grip() {
    translate([0,0,-nudge])
    rotate([0,-90,0])
    rotate([0,0,gripAngle])
    intersection() {
        union() {
            pointHull(concat(atXY(gripOutlineBottomView,wallThicknesss/2*tan(gripAngle),wallThicknesss/2),atXY(gripOutlineBottomView,-gripOffset,-gripHeight)));
           translate([0,0,gripWidth/2]) rotate([0,90,0]) translate([0,size_xsect_1[1]/2-nudge+tolerance+wallThicknesss,0]) linear_extrude(height=gripLength+tan(gripAngle)*(2*tolerance+2*wallThicknesss+size_xsect_1[1])) outline();
        }
        linear_extrude(height=3*gripWidth+size_xsect_1[1]*3,center=true) polygon(gripOutlineSideView);
    }
}

module grippy() {
    grip();
}

if (!includeGrip)
    gripless();
else
    grip();
